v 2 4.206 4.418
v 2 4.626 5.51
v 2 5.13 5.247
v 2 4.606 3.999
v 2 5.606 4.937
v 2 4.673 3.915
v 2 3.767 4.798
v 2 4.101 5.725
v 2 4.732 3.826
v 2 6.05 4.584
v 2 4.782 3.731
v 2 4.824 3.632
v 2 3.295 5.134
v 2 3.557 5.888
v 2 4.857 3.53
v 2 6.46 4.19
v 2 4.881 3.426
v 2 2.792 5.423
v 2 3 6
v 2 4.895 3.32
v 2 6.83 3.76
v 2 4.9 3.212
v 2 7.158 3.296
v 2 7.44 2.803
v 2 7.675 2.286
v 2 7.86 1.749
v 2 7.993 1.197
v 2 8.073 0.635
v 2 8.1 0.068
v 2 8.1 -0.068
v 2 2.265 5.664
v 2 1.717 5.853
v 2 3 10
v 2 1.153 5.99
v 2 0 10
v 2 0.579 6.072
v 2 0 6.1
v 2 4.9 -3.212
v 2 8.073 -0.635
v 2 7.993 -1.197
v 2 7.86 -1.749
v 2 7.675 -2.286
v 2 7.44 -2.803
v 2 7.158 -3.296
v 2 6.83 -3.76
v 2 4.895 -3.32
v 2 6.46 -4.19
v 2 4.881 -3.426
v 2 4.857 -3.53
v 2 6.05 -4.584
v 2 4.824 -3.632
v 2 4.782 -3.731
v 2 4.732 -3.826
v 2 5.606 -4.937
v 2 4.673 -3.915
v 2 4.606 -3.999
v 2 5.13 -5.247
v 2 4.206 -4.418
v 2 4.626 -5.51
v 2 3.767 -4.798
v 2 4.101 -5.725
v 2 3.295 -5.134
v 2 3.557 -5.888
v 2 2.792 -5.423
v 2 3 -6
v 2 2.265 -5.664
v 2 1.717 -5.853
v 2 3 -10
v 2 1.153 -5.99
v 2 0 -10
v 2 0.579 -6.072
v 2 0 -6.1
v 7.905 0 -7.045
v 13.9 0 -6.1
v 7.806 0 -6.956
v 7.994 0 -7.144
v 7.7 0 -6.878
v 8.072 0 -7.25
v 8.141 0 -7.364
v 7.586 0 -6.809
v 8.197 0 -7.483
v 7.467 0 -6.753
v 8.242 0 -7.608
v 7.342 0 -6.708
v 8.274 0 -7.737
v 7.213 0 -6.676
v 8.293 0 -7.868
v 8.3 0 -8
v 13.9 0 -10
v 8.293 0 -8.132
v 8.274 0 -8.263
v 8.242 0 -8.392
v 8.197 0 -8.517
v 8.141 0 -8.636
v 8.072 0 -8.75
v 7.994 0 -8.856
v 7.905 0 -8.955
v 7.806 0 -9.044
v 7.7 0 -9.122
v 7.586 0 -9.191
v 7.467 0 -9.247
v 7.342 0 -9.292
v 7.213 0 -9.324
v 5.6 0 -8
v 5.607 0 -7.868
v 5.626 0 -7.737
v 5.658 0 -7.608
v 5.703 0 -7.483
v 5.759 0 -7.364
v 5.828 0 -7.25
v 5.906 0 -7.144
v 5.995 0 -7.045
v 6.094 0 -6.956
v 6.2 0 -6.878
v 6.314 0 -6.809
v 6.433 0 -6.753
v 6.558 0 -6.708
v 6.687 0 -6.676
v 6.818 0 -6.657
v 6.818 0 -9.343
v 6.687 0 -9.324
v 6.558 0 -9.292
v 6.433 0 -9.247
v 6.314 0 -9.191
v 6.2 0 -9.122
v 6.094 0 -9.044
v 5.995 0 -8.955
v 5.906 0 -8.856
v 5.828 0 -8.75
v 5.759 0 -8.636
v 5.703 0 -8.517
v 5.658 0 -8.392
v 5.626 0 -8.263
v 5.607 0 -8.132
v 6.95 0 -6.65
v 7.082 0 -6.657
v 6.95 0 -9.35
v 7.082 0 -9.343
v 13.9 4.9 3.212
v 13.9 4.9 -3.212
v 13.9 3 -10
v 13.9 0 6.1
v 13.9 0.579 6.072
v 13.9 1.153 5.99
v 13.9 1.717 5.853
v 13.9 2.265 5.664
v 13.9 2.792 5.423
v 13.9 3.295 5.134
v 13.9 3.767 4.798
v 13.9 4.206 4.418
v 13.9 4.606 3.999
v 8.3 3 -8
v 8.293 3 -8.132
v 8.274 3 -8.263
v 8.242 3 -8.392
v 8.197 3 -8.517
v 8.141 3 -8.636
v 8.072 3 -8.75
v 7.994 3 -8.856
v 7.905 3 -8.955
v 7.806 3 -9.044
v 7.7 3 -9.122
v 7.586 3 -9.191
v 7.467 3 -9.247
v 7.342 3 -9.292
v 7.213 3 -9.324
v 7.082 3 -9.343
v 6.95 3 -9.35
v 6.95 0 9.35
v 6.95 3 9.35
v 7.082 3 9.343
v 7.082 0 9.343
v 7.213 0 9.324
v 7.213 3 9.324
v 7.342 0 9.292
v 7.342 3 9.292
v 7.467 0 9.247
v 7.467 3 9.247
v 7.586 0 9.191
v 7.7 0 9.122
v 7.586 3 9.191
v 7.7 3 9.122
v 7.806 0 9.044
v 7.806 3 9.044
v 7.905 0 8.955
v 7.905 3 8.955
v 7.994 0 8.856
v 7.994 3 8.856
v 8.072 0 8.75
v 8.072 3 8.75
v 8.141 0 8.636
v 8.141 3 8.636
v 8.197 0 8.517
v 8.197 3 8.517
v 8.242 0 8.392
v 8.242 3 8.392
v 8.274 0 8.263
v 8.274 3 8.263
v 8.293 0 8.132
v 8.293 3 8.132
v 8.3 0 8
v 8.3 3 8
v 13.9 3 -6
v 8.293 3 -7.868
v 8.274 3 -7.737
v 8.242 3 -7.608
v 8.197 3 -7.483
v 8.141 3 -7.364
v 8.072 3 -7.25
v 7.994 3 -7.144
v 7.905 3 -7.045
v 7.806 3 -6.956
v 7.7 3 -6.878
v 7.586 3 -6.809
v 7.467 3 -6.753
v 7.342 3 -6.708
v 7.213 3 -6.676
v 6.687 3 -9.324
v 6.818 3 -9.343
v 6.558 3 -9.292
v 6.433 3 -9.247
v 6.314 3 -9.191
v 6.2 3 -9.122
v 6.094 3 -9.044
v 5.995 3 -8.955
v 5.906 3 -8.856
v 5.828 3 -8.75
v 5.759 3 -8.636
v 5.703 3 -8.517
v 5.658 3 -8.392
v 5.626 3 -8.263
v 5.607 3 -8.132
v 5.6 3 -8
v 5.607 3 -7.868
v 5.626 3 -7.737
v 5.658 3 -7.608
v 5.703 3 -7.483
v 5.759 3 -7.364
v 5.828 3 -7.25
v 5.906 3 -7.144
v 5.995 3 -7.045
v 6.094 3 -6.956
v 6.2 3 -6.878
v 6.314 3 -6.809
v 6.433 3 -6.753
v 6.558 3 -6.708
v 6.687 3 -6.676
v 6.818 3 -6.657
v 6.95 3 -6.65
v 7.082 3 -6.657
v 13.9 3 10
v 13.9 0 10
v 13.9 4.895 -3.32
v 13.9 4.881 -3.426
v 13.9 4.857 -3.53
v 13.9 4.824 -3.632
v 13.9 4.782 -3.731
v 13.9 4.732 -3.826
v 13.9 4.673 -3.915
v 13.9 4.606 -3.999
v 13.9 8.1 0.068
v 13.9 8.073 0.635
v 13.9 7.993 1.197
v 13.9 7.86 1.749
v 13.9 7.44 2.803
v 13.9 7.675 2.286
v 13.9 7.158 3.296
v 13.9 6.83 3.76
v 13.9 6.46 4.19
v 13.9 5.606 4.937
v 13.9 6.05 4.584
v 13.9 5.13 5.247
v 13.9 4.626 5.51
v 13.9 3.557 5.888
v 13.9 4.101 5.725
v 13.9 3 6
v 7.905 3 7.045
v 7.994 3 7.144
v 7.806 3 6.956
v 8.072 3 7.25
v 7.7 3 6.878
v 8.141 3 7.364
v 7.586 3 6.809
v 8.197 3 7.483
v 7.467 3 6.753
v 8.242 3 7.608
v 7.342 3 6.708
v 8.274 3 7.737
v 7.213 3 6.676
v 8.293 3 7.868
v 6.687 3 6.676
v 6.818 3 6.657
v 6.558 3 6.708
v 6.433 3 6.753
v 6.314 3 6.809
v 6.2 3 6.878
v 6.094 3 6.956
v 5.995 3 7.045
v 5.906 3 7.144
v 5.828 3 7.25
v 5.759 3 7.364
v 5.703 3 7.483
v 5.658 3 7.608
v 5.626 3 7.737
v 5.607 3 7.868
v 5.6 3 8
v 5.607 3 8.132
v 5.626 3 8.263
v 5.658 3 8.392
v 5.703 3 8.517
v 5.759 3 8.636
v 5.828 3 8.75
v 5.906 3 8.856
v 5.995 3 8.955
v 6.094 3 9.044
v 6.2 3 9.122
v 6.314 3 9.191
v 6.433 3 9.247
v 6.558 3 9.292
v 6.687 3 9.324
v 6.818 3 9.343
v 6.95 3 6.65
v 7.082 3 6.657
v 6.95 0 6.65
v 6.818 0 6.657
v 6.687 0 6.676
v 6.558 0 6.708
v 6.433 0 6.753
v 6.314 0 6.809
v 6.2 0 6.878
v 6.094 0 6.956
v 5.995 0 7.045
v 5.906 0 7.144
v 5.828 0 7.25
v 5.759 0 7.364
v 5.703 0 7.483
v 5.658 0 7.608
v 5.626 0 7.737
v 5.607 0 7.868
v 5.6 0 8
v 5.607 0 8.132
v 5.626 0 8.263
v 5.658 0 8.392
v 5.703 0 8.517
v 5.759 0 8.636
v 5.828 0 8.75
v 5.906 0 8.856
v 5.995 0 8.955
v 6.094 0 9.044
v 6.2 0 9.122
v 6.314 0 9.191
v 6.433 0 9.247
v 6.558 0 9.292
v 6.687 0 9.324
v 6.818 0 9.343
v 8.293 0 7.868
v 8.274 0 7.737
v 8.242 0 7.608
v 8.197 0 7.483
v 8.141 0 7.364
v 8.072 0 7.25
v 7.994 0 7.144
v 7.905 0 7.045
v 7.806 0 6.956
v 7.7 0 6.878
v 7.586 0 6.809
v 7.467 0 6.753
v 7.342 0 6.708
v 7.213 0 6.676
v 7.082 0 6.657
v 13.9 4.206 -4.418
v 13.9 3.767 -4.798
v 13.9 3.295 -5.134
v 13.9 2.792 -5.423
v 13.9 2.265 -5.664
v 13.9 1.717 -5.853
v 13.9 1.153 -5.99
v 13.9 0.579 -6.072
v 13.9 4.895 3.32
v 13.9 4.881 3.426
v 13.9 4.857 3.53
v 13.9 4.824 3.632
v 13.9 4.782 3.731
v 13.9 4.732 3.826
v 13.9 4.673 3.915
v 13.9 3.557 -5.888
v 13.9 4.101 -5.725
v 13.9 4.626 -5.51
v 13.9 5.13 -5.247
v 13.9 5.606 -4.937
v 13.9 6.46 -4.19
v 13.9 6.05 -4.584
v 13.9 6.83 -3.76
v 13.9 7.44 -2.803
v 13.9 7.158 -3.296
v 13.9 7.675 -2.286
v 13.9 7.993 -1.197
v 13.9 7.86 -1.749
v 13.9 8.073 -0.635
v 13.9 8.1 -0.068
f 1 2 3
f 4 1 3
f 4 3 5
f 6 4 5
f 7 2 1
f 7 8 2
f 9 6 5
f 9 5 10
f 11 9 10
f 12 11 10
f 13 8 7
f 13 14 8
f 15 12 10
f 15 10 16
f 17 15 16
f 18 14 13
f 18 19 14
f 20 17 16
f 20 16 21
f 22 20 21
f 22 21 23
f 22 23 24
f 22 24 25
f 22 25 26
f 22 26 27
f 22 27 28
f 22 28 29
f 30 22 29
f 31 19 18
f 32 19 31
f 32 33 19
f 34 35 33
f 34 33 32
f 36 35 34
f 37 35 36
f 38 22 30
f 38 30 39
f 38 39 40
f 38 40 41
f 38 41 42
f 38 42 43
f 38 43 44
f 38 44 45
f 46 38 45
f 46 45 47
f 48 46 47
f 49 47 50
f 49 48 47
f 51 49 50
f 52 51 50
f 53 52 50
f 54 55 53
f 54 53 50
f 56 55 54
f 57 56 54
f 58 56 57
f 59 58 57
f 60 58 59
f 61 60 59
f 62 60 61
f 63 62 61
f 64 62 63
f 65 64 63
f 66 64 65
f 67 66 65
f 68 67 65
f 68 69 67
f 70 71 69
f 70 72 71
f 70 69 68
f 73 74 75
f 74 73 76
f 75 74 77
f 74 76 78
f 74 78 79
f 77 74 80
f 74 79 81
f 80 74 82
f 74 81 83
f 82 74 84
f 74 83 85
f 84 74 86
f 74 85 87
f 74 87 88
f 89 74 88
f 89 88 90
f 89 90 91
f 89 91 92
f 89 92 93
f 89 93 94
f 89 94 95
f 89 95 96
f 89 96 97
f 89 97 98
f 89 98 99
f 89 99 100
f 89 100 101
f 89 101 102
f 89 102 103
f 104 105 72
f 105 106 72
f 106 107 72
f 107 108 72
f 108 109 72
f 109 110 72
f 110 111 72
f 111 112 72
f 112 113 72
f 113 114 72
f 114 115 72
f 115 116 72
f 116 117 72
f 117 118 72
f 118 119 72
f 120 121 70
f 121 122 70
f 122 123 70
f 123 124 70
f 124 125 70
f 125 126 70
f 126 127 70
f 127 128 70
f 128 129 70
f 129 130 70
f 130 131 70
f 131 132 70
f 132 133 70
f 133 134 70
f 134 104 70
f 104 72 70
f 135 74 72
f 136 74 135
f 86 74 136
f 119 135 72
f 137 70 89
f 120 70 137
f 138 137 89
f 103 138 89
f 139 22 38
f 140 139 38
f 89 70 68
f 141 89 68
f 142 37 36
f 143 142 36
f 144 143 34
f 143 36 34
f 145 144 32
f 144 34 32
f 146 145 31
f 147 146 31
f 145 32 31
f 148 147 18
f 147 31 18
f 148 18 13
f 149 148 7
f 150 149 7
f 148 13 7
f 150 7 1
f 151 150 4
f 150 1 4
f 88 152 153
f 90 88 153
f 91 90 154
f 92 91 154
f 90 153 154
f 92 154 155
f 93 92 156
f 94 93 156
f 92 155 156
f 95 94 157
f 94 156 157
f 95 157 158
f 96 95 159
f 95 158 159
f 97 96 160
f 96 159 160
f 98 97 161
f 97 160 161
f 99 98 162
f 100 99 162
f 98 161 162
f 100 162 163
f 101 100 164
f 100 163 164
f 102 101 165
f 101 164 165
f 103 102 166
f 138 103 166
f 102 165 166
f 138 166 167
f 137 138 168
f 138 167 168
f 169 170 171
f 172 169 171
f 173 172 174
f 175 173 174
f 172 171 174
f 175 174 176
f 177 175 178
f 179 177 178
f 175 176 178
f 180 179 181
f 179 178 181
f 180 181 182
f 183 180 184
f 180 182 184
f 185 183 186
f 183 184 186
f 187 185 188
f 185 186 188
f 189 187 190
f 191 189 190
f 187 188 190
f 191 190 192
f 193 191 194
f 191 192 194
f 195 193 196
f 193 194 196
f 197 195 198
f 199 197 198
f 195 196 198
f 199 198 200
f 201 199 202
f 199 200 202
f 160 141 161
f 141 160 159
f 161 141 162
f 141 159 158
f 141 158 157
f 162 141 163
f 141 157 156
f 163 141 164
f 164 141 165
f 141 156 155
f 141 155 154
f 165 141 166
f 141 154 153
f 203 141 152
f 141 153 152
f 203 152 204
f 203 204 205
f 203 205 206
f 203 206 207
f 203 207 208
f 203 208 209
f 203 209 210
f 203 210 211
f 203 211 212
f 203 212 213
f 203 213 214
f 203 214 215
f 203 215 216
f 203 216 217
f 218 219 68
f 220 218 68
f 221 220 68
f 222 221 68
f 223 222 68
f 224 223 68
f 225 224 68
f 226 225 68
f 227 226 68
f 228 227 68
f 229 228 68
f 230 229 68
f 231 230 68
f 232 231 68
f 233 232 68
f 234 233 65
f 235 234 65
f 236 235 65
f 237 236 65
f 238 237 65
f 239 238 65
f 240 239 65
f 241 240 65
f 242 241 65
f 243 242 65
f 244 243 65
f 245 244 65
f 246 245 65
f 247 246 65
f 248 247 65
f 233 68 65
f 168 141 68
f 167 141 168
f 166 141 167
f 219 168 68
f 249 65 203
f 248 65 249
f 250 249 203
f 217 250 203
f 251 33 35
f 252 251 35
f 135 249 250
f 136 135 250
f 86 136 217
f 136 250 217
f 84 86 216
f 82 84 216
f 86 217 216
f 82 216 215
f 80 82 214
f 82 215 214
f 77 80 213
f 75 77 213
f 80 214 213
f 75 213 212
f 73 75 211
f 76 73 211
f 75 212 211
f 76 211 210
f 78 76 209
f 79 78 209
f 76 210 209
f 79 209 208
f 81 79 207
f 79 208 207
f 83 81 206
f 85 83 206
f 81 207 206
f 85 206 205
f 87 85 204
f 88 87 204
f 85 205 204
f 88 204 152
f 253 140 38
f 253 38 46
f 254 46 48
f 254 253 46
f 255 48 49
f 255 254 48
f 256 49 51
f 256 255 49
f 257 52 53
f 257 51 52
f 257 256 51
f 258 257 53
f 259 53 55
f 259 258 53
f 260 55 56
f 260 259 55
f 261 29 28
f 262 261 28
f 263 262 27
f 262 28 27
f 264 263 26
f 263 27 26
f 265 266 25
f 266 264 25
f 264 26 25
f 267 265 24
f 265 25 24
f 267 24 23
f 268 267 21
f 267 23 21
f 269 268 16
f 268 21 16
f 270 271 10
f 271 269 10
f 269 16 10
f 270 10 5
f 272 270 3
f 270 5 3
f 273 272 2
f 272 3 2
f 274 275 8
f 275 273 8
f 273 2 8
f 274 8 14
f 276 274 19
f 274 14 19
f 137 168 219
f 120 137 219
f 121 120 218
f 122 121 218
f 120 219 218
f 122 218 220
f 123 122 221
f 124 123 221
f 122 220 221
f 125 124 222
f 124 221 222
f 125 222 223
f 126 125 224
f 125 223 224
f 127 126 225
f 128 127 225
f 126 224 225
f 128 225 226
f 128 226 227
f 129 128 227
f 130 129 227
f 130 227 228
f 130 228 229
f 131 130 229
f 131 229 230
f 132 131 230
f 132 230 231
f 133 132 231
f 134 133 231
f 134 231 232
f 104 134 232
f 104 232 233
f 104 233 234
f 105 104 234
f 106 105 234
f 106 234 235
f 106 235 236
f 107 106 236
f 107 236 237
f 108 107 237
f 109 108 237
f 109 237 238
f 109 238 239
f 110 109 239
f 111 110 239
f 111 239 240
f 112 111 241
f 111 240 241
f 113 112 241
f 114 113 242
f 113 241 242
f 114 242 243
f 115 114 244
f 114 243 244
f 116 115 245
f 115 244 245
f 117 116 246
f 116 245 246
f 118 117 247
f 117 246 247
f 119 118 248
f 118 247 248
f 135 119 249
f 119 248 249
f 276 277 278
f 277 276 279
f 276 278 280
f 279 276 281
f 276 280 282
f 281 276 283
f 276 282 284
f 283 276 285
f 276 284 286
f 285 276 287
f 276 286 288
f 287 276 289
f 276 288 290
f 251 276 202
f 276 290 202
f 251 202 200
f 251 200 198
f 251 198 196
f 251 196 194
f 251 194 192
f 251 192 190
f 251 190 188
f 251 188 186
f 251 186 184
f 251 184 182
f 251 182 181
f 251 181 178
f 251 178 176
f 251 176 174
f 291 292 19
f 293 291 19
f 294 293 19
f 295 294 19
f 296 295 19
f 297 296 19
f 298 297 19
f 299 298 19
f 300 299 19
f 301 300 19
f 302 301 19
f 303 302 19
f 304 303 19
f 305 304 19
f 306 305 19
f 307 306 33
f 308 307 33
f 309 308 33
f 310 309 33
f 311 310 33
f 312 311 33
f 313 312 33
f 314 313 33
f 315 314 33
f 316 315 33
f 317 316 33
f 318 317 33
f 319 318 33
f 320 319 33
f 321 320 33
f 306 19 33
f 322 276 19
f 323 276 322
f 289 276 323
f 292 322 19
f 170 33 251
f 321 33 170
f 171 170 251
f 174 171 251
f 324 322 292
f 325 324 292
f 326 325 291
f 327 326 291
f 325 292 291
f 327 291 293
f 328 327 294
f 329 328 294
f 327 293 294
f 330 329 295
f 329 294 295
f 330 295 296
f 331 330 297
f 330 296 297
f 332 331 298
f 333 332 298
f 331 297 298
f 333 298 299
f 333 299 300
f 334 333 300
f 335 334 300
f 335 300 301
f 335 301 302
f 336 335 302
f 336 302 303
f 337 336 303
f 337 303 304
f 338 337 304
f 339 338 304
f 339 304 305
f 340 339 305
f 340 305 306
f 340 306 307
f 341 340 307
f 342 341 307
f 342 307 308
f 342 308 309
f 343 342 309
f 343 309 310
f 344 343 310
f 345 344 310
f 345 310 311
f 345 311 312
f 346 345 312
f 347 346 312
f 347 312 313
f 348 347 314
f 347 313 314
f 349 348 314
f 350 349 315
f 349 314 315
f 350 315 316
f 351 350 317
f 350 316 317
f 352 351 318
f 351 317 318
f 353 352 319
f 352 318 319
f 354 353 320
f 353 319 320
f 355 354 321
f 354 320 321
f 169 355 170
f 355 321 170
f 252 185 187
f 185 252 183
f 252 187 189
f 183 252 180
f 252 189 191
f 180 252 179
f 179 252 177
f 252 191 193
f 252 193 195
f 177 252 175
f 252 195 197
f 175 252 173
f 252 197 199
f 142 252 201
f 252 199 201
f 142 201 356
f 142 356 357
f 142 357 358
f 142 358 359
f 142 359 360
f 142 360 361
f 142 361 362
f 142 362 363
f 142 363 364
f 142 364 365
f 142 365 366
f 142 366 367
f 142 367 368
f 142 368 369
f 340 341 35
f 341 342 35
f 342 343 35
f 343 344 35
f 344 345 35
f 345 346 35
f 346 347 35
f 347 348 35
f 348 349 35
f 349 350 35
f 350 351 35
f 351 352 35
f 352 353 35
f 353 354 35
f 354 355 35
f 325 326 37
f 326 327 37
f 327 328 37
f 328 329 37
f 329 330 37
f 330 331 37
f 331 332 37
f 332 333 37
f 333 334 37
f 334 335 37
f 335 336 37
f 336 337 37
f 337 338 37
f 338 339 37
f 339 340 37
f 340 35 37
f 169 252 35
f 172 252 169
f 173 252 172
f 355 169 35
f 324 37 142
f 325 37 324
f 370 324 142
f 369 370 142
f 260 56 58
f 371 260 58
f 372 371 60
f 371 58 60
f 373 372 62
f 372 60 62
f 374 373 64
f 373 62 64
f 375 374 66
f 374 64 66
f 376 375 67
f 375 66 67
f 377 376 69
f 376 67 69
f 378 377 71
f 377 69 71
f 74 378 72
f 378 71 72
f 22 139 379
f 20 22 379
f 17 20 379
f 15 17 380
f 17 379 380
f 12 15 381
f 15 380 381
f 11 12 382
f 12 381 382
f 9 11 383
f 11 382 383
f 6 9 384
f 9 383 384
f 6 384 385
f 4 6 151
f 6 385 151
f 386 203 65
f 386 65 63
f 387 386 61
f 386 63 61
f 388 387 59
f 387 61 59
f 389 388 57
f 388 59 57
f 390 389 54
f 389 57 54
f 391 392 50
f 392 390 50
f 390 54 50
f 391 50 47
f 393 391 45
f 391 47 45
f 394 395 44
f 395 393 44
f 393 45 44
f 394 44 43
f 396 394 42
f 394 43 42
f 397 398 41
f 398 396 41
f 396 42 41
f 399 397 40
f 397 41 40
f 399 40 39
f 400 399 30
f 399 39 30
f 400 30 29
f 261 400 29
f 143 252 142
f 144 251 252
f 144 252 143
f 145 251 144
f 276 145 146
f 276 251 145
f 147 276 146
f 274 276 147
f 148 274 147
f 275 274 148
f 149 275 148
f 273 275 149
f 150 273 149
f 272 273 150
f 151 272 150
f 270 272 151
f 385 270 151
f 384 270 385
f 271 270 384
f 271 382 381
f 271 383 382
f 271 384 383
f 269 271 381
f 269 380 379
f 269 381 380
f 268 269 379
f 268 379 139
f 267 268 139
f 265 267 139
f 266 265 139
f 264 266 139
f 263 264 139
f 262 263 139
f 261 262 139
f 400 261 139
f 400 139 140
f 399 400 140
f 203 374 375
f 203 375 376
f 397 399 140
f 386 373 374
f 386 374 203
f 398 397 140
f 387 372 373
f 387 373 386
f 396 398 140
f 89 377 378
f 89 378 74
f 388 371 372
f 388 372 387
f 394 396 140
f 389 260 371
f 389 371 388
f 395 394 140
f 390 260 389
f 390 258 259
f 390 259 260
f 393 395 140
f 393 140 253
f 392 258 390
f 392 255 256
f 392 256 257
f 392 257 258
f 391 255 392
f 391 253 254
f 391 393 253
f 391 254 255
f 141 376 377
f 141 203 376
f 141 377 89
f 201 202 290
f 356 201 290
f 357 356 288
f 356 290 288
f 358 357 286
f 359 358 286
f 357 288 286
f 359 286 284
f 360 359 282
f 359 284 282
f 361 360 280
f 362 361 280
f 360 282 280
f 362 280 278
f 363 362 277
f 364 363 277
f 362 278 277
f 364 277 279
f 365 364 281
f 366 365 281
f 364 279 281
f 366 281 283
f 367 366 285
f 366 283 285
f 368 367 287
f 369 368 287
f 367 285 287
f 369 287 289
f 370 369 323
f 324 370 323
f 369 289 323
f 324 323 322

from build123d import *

# Parameters (mm, degrees)
RESSALTO_EXTRUS_O1_DEPTH   = 13.9
FILETE1_R                  = 6
CORTE_EXTRUS_O1_DEPTH      = 13.9
FILETE2_R                  = 1.2
CORTE_EXTRUS_O2_DEPTH      = 18.866728856
CORTE_EXTRUS_O2_DEPTH_BACK = 18.866728856
ESBO_O3_W                  = 2
ESBO_O3_H                  = 20.053518914


with BuildPart() as part:
    # Esboço1 → Ressalto-extrusão1 (new body)
    with BuildSketch(Plane(origin=(0, 0, 0), x_dir=(0, 0, -1), z_dir=(1, 0, 0))):
        with BuildLine():
            ThreePointArc((-3.633180425, 4.9), (-1.913112647, 5.792236183), (0, 6.1))
            ThreePointArc((0, 6.1), (1.913112647, 5.792236183), (3.633180425, 4.9))
            ThreePointArc((3.633180425, 4.9), (5.448504409, 2.742954557), (6.1, 0))
            Line((6.1, 0), (10, 0))
            Line((10, 0), (10, 3))
            Line((10, 3), (6, 3))
            Line((6, 3), (6, 8.1))
            Line((6, 8.1), (-6, 8.1))
            Line((-6, 8.1), (-6, 3))
            Line((-6, 3), (-10, 3))
            Line((-10, 3), (-10, 0))
            Line((-10, 0), (-6.1, 0))
            ThreePointArc((-6.1, 0), (-5.448504409, 2.742954557), (-3.633180425, 4.9))
        make_face()
        with BuildLine():
            ThreePointArc((3.633180425, 4.9), (1.913112647, 5.792236183), (0, 6.1))
            Line((0, 6.1), (0, 4.9))
            Line((0, 4.9), (3.633180425, 4.9))
        make_face()
        with BuildLine():
            Line((0, 4.9), (0, 6.1))
            ThreePointArc((0, 6.1), (-1.913112647, 5.792236183), (-3.633180425, 4.9))
            Line((-3.633180425, 4.9), (0, 4.9))
        make_face()
    extrude(amount=RESSALTO_EXTRUS_O1_DEPTH)

    # Filete1
    # the kernel refuses this fillet: 6 mm, written as the material it takes off along each edge
    with BuildSketch(Plane(origin=(-14.83028995, 8.1, 6), x_dir=(0, -1, 0), z_dir=(1, 0, 0))) as filete1_piece_1:
        with BuildLine():
            CenterArc((6, 5.93211598), FILETE1_R, 180, 81.373073441)
            Line((0, 5.93211598), (-0.12, 5.93211598))
            Line((-0.12, 5.93211598), (-0.12, 0))
            Line((-0.12, 0), (0, -0.12))
            ThreePointArc((0, -0.12), (2.55, -0.12), (5.082, -0.11864232))
            Line((5.082, -0.11864232), (5.1, 0))
        make_face()
    extrude(amount=43.5605799, mode=Mode.SUBTRACT)
    with BuildSketch(Plane(origin=(-14.83028995, 8.1, -6), x_dir=(0, -1, 0), z_dir=(1, 0, 0))) as filete1_piece_2:
        with BuildLine():
            CenterArc((6, -5.93211598), FILETE1_R, 98.626926559, 81.373073441)
            Line((0, -5.93211598), (-0.12, -5.93211598))
            Line((-0.12, -5.93211598), (-0.12, 0))
            Line((-0.12, 0), (0, 0.12))
            ThreePointArc((0, 0.12), (2.55, 0.12), (5.082, 0.11864232))
            Line((5.082, 0.11864232), (5.1, 0))
        make_face()
    extrude(amount=43.5605799, mode=Mode.SUBTRACT)

    # Esboço2 → Corte-extrusão1 (cut)
    with BuildSketch(Plane(origin=(0, 3, 0), x_dir=(1, 0, 0), z_dir=(0, 1, 0))):
        with BuildLine():
            ThreePointArc((6.95, 9.35), (5.6, 8), (6.95, 6.65))
            Line((6.95, 6.65), (6.95, 9.35))
        make_face()
        with BuildLine():
            Line((6.95, 9.35), (6.95, 6.65))
            ThreePointArc((6.95, 6.65), (7.904594155, 7.045405845), (8.3, 8))
            ThreePointArc((8.3, 8), (7.904594155, 8.954594155), (6.95, 9.35))
        make_face()
        with BuildLine():
            ThreePointArc((8.3, -8), (7.904594155, -7.045405845), (6.95, -6.65))
            Line((6.95, -6.65), (6.95, -9.35))
            ThreePointArc((6.95, -9.35), (7.904594155, -8.954594155), (8.3, -8))
        make_face()
        with BuildLine():
            Line((6.95, -9.35), (6.95, -6.65))
            ThreePointArc((6.95, -6.65), (5.6, -8), (6.95, -9.35))
        make_face()
    extrude(amount=-CORTE_EXTRUS_O1_DEPTH, mode=Mode.SUBTRACT)

    # Filete2
    filete2_edges = [part.edges().sort_by_distance(p)[0] for p in [
        (6.95, 4.9, -3.633180425),
        (6.95, 4.9, 3.633180425),
    ]]
    fillet(filete2_edges, radius=FILETE2_R)

    # Esboço3 → Corte-extrusão2 (cut, two sides: drawn at the far end of the back side and taken through both)
    with BuildSketch(Plane(origin=(0, 3, 0), x_dir=(1, 0, 0), z_dir=(0, 1, 0)).offset(-CORTE_EXTRUS_O2_DEPTH_BACK)):
        with Locations((1, -0.026759457)):
            Rectangle(ESBO_O3_W, ESBO_O3_H)
    extrude(amount=CORTE_EXTRUS_O2_DEPTH + CORTE_EXTRUS_O2_DEPTH_BACK, mode=Mode.SUBTRACT)


solid = part.part
